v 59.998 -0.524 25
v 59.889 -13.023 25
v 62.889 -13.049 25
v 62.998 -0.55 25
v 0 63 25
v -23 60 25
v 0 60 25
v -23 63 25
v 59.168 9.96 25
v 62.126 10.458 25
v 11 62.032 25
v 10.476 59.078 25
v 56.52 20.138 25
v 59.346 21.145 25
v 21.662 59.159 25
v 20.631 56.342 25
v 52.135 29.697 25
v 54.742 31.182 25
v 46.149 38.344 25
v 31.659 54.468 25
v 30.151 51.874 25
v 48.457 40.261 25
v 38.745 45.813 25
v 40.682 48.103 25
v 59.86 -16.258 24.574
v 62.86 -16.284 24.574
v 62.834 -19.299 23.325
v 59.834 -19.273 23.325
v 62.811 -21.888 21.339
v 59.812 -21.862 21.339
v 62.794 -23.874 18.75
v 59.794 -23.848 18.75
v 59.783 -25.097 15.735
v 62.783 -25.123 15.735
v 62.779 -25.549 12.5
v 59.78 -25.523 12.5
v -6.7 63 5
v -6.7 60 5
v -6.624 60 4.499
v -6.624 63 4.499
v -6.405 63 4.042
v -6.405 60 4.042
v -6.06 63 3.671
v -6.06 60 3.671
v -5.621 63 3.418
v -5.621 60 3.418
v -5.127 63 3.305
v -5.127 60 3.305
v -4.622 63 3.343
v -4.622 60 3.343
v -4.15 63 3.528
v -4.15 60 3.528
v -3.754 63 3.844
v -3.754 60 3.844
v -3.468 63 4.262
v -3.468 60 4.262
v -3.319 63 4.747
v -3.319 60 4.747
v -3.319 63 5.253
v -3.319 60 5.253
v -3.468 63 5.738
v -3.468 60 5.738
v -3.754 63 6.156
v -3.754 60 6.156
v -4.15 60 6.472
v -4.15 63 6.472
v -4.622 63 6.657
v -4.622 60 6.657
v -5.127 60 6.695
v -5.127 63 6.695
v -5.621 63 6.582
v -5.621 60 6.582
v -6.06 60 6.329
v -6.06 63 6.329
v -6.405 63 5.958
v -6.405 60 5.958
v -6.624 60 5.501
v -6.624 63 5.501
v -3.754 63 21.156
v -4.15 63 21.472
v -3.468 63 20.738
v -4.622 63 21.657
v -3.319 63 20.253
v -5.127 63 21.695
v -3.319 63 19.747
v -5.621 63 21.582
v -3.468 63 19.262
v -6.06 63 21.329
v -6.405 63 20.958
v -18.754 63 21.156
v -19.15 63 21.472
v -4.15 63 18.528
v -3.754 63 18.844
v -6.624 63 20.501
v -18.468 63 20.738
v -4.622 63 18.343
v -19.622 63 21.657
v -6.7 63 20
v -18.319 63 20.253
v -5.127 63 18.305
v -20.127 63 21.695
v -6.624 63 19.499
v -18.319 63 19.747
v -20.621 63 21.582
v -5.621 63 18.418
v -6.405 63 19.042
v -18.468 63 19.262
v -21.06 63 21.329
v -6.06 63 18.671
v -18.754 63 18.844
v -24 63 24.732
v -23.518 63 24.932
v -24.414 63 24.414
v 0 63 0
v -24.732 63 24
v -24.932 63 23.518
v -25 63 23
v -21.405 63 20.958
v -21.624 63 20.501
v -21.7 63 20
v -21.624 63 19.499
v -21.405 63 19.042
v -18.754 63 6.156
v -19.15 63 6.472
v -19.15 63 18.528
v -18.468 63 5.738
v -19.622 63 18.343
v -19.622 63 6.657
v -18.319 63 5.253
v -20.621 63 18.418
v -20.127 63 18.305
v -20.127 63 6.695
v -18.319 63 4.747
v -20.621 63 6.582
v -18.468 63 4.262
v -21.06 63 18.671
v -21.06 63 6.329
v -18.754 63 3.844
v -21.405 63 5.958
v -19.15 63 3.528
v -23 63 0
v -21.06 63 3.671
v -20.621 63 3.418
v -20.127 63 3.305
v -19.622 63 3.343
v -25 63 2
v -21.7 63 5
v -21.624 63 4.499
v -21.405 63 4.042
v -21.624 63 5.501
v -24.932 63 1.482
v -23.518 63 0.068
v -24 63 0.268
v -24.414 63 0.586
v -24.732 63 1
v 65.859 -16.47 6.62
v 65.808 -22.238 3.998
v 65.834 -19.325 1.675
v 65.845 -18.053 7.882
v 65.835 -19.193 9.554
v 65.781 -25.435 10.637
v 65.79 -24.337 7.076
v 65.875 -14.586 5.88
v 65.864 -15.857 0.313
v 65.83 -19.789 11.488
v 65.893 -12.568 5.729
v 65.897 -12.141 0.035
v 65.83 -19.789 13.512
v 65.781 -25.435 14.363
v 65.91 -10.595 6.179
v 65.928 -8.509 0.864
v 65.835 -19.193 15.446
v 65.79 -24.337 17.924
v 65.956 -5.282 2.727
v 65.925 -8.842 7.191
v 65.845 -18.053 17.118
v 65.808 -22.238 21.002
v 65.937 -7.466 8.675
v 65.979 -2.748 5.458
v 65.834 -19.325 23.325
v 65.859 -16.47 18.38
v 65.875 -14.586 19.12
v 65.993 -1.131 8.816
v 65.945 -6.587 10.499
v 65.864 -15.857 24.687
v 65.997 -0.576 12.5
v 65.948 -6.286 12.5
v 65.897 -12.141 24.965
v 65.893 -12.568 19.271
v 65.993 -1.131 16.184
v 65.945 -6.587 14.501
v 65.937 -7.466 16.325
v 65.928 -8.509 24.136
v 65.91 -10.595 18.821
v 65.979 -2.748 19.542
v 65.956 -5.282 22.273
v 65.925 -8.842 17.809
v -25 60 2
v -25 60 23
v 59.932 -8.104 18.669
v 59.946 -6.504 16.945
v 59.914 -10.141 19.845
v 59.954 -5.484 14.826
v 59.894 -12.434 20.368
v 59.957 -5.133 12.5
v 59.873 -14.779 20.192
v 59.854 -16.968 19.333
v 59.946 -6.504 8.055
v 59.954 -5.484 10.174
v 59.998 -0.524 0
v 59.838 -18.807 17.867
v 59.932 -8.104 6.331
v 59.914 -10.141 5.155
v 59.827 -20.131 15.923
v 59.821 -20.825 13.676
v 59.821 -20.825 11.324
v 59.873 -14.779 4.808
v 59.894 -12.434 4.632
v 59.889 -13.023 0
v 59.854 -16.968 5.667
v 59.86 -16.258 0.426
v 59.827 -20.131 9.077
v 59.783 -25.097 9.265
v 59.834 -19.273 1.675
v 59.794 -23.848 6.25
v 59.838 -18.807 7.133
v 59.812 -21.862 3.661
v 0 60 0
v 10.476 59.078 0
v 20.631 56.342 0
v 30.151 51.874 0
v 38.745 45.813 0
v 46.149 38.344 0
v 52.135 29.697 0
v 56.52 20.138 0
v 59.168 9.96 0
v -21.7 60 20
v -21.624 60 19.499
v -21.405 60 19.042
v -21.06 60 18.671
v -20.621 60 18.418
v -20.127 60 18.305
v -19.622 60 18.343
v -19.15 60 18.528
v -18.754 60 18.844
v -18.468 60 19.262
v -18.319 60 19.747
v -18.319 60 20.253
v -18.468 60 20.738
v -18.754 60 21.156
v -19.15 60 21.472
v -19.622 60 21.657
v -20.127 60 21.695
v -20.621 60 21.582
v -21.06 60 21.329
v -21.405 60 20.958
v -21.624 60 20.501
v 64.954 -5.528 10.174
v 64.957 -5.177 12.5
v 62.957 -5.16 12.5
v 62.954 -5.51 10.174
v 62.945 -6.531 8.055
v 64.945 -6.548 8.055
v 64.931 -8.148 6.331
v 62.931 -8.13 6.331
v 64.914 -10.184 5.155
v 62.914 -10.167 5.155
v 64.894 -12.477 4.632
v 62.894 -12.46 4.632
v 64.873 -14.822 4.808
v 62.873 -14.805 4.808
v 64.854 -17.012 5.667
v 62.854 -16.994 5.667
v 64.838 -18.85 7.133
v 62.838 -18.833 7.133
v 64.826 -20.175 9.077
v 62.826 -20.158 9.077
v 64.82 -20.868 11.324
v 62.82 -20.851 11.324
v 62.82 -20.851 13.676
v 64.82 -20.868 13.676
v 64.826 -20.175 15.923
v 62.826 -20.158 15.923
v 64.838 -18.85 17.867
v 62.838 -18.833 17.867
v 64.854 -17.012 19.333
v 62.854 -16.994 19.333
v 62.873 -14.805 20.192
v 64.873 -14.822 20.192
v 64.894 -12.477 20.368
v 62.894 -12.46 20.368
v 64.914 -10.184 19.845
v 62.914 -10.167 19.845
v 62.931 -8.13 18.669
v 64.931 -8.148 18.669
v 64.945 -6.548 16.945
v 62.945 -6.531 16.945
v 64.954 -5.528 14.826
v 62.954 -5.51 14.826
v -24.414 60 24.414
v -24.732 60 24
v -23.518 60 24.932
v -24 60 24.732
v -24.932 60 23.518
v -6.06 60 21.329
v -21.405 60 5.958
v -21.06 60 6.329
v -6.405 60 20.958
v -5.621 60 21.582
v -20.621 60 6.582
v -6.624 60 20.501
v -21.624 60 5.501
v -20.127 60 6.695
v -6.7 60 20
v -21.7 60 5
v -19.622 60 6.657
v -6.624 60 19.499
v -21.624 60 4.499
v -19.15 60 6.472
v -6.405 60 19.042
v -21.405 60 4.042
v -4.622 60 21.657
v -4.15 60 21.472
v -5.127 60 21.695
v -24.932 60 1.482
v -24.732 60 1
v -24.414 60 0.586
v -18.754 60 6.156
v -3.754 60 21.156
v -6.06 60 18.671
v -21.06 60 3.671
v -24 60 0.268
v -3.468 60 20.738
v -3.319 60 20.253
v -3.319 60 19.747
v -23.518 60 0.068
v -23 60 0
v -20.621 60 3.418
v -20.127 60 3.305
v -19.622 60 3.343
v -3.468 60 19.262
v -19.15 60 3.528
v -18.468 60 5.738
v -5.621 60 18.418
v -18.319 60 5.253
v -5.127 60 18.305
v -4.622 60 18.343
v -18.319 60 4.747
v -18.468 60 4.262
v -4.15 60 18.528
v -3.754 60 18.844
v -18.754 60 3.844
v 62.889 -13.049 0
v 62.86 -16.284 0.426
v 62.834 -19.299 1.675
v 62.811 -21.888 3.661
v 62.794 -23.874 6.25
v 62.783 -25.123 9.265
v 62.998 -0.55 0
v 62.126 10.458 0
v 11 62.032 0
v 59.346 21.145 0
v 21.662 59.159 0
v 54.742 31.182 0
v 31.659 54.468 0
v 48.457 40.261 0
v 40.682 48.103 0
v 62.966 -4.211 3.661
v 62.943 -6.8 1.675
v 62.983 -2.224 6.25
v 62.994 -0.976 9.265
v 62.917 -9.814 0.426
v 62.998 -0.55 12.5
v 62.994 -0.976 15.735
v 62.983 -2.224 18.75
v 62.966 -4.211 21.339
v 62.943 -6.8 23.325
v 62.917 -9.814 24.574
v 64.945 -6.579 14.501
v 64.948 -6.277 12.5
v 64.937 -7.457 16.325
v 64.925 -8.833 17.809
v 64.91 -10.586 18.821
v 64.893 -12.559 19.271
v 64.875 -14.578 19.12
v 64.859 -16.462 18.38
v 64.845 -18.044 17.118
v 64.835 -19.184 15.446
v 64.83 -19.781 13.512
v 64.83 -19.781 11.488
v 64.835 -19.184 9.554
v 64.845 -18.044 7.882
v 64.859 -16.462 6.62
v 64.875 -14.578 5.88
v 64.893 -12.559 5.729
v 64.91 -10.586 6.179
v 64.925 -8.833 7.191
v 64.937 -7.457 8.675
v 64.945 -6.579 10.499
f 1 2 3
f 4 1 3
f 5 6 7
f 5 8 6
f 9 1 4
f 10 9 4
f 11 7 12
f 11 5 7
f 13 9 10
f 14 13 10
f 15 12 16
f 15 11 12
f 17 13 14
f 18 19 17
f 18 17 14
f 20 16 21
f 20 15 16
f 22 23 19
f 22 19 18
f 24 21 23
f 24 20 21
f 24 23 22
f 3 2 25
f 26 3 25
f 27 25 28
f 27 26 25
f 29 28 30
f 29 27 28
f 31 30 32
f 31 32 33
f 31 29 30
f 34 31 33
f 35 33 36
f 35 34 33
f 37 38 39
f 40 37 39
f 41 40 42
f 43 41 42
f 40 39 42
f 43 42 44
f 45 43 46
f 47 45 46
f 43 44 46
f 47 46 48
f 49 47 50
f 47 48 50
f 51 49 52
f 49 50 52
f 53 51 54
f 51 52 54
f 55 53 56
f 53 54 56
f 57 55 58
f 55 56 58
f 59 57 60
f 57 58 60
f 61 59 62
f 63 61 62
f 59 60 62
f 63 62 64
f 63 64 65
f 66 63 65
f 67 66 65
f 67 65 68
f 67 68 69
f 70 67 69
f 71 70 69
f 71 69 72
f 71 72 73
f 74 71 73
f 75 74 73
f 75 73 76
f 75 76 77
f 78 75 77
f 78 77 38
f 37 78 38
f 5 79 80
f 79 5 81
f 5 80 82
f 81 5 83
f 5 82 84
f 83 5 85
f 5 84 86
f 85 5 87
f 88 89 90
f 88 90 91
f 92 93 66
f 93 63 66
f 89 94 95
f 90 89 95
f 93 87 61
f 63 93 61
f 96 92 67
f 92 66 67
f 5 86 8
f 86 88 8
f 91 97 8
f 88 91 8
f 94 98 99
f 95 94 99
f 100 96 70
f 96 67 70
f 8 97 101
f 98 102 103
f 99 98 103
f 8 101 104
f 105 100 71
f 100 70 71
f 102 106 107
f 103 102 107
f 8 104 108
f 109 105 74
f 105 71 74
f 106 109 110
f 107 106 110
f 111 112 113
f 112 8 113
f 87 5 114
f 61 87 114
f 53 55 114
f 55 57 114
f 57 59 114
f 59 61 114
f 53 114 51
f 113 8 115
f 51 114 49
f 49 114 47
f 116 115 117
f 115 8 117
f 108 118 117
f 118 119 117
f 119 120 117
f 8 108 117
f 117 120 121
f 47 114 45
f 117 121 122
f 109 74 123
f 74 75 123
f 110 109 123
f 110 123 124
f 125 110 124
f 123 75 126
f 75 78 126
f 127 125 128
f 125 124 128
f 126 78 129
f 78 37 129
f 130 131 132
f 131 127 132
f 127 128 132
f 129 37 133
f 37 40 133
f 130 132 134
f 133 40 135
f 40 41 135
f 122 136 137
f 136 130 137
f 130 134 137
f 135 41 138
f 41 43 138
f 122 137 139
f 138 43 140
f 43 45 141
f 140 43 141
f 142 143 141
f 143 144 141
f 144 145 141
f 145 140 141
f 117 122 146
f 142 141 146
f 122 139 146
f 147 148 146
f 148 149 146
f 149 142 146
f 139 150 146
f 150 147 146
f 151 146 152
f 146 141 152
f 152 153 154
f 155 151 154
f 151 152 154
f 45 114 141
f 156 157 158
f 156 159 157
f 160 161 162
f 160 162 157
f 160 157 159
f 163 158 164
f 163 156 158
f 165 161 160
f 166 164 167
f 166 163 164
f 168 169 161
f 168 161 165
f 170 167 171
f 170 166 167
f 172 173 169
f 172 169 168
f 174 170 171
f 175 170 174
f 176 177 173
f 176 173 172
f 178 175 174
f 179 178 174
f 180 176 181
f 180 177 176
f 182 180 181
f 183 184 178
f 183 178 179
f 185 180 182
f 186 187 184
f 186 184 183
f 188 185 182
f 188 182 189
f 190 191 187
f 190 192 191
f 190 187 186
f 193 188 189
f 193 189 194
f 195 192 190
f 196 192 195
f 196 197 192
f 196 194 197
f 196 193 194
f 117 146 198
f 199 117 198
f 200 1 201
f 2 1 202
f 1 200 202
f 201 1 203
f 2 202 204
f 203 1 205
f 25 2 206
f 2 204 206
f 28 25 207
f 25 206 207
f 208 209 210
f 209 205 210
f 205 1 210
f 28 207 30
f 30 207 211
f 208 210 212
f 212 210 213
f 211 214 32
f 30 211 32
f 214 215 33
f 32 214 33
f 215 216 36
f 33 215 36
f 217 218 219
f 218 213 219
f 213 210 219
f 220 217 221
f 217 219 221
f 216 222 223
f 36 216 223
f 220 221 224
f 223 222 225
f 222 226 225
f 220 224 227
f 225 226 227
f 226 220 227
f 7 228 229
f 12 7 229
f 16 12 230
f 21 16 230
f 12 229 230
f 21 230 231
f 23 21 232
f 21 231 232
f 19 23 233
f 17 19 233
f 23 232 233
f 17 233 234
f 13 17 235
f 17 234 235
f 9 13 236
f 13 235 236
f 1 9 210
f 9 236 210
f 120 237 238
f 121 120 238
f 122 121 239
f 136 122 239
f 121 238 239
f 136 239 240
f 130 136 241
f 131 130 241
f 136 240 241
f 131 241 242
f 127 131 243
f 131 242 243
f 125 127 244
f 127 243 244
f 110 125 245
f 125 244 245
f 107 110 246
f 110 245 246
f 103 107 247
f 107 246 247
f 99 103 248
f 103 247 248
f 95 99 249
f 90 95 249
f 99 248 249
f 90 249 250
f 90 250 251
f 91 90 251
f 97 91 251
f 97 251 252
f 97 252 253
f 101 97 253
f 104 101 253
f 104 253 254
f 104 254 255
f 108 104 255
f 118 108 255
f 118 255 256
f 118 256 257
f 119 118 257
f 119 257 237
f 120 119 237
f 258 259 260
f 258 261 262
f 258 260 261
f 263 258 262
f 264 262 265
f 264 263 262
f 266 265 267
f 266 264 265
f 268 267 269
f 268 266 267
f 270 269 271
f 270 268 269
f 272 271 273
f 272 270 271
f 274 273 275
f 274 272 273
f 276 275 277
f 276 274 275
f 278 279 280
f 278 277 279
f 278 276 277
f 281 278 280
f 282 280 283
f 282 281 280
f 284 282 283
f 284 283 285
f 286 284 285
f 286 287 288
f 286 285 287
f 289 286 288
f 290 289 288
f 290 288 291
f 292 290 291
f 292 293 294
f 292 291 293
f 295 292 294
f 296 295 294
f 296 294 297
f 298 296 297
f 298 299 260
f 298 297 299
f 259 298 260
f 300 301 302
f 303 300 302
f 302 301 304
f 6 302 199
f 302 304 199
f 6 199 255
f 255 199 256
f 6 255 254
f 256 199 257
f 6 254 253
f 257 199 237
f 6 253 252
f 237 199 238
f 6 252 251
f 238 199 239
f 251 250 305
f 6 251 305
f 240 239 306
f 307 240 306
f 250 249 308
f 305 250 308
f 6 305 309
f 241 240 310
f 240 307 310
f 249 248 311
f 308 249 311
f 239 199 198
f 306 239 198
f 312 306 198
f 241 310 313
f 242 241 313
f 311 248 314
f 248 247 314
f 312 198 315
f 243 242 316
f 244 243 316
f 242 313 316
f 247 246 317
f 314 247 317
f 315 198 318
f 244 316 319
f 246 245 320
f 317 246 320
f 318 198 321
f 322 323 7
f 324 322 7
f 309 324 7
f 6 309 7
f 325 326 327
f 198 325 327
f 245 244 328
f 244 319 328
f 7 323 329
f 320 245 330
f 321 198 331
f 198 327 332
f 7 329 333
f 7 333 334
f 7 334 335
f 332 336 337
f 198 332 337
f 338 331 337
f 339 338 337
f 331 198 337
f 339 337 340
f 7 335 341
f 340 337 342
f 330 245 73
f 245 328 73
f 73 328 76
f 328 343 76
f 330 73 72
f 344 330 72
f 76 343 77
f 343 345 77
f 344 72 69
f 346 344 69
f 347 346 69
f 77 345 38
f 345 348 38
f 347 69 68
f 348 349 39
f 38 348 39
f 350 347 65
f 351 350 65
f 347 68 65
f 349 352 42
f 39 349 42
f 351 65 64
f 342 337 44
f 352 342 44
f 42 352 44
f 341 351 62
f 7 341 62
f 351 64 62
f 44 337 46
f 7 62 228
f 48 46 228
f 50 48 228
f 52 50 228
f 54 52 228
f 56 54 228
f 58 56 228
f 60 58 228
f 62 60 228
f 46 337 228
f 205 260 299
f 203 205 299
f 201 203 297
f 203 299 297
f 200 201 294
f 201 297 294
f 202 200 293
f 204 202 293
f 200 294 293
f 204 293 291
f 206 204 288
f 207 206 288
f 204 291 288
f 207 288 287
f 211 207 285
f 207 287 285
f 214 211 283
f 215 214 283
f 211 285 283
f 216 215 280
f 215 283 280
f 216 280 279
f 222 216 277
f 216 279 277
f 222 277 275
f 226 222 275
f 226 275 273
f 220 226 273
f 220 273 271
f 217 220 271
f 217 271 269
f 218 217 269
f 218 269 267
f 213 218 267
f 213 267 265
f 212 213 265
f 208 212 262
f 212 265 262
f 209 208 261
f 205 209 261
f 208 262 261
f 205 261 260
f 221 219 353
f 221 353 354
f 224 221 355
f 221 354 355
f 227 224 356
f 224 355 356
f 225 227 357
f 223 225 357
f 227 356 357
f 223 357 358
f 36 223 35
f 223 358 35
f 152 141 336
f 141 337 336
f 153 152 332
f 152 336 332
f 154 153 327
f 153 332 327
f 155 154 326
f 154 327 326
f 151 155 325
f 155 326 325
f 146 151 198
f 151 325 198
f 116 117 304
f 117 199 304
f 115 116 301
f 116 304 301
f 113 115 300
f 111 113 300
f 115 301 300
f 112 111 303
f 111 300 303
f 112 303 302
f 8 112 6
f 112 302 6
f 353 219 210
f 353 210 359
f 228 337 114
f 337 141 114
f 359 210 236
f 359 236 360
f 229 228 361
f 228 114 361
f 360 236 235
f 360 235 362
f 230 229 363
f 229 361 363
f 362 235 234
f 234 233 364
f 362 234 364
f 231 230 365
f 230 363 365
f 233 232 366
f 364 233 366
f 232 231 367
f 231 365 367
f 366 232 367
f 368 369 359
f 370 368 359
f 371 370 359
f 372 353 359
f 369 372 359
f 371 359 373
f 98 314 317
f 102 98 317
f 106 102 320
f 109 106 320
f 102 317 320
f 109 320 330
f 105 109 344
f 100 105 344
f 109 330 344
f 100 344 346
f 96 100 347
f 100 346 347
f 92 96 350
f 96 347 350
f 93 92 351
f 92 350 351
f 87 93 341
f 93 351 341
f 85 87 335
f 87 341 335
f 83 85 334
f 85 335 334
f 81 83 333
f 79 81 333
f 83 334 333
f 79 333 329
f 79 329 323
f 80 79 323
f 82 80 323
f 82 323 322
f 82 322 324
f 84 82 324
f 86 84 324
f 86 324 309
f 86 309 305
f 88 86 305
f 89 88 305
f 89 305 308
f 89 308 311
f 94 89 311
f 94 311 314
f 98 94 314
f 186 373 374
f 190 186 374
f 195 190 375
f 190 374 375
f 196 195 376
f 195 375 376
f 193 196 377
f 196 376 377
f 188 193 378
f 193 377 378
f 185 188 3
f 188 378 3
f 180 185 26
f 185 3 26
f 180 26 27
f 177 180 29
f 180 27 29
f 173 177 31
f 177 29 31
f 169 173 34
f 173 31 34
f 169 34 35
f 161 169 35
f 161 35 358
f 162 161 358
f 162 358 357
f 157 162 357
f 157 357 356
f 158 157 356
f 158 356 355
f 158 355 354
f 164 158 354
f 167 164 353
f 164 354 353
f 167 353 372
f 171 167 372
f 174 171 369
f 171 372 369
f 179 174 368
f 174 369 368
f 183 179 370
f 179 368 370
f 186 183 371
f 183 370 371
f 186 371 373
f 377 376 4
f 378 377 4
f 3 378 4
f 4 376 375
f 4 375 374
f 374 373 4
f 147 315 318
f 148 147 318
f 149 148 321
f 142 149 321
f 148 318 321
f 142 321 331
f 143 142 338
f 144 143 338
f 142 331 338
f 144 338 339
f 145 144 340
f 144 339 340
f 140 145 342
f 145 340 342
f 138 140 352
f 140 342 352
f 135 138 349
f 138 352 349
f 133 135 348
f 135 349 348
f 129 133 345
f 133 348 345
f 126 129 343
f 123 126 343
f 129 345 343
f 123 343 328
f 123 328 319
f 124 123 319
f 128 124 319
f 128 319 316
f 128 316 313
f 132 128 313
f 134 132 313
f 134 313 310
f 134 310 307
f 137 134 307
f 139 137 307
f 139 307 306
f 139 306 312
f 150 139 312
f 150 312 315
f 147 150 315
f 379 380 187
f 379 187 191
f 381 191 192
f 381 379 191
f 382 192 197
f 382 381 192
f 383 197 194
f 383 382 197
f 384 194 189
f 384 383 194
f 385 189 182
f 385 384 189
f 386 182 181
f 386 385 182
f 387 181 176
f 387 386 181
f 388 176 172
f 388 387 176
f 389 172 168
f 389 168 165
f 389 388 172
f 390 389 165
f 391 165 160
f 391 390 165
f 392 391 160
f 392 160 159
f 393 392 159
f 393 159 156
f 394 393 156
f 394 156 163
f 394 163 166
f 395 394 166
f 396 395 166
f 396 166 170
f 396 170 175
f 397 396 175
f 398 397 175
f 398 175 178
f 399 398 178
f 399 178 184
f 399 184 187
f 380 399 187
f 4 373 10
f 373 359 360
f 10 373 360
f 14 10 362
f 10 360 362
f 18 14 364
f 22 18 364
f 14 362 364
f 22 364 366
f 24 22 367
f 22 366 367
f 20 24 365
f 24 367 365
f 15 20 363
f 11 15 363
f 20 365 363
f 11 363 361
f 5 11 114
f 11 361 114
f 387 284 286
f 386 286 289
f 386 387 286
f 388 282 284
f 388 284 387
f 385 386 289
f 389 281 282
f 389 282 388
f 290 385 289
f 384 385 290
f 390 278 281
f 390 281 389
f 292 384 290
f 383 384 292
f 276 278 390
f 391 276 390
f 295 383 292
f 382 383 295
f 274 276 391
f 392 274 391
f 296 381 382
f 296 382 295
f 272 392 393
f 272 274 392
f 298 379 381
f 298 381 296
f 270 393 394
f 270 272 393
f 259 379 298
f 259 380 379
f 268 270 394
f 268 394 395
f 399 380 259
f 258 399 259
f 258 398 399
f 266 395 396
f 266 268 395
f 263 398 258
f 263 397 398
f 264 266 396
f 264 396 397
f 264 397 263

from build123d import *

# Parameters (mm, degrees)
BOSS_EXTRUDE1_DEPTH  = 25
M3_CLEARANCE_HOLE1_D = 3.4
SKETCH6_R            = 7.89
CUT_EXTRUDE1_DEPTH   = 3
FILLET1_R            = 12.5
FILLET2_R            = 2
SKETCH7_R            = 12.5
SKETCH7_R_2          = 6.79
BOSS_EXTRUDE2_DEPTH  = 3
CUT_EXTRUDE2_START   = -5
SKETCH9_R            = 7.89
CUT_EXTRUDE2_DEPTH   = 5


with BuildPart() as part:
    # Sketch2 → Boss-Extrude1 (new body)
    with BuildSketch(Plane.XY):
        with BuildLine():
            Line((0, 63), (-25, 63))
            Line((-25, 63), (-25, 60))
            Line((-25, 60), (0, 60))
            ThreePointArc((0, 60), (42.611122537, 42.240883467), (59.997715384, -0.52359213))
            Line((59.997715384, -0.52359213), (59.779551996, -25.522640207))
            Line((59.779551996, -25.522640207), (62.779437766, -25.548819813))
            Line((62.779437766, -25.548819813), (62.997601153, -0.549771736))
            ThreePointArc((62.997601153, -0.549771736), (44.741678664, 44.352927641), (0, 63))
        make_face()
    extrude(amount=BOSS_EXTRUDE1_DEPTH)

    # M3 Clearance Hole1 (through all)
    with Locations(Plane(origin=(0, 63, 0), x_dir=(1, 0, 0), z_dir=(0, 1, 0))):
        with Locations((-20, -5), (-5, -20), (-20, -20), (-5, -5)):
            Hole(M3_CLEARANCE_HOLE1_D / 2)

    # Sketch6 → Cut-Extrude1 (cut)
    with BuildSketch(Plane(origin=(62.997601153, -0.549771736, 0), x_dir=(0, 0, -1), z_dir=(0.9999619230641714, -0.00872653549837746, 0))):
        with Locations(Location((-12.5, -12.5, 0), (0, 0, 90))):
            Circle(SKETCH6_R)
    extrude(amount=-CUT_EXTRUDE1_DEPTH, mode=Mode.SUBTRACT)

    # Fillet1
    fillet1_edges = [part.edges().sort_by_distance(p)[0] for p in [
        (61.279494881, -25.53573001, 0),
        (61.279494881, -25.53573001, 25),
    ]]
    fillet(fillet1_edges, radius=FILLET1_R - 0.0001)  # a hair under: the kernel refuses the full size

    # Fillet2
    fillet2_edges = [part.edges().sort_by_distance(p)[0] for p in [
        (-25, 61.5, 25),
        (-25, 61.5, 0),
    ]]
    fillet(fillet2_edges, radius=FILLET2_R)

    # Sketch7 → Boss-Extrude2 (add)
    with BuildSketch(Plane(origin=(62.997601153, -0.549771736, 0), x_dir=(0, 0, -1), z_dir=(0.9999619230641714, -0.00872653549837732, 0))):
        with Locations(Location((-12.5, -12.5, 0), (0, 0, 90))):
            Circle(SKETCH7_R)
        with Locations(Location((-12.5, -12.5, 0), (0, 0, 90))):
            Circle(SKETCH7_R_2, mode=Mode.SUBTRACT)
    extrude(amount=BOSS_EXTRUDE2_DEPTH)

    # Sketch9 → Cut-Extrude2 (cut)
    with BuildSketch(Plane(origin=(59.997715384, -0.52359213, 0), x_dir=(0, 0, 1), z_dir=(-0.9999619230641714, 0.008726535498377324, 0)).offset(CUT_EXTRUDE2_START)):
        with Locations(Location((12.5, -12.5, 0), (0, 0, 90))):
            Circle(SKETCH9_R)
    extrude(amount=CUT_EXTRUDE2_DEPTH, mode=Mode.SUBTRACT)


solid = part.part
